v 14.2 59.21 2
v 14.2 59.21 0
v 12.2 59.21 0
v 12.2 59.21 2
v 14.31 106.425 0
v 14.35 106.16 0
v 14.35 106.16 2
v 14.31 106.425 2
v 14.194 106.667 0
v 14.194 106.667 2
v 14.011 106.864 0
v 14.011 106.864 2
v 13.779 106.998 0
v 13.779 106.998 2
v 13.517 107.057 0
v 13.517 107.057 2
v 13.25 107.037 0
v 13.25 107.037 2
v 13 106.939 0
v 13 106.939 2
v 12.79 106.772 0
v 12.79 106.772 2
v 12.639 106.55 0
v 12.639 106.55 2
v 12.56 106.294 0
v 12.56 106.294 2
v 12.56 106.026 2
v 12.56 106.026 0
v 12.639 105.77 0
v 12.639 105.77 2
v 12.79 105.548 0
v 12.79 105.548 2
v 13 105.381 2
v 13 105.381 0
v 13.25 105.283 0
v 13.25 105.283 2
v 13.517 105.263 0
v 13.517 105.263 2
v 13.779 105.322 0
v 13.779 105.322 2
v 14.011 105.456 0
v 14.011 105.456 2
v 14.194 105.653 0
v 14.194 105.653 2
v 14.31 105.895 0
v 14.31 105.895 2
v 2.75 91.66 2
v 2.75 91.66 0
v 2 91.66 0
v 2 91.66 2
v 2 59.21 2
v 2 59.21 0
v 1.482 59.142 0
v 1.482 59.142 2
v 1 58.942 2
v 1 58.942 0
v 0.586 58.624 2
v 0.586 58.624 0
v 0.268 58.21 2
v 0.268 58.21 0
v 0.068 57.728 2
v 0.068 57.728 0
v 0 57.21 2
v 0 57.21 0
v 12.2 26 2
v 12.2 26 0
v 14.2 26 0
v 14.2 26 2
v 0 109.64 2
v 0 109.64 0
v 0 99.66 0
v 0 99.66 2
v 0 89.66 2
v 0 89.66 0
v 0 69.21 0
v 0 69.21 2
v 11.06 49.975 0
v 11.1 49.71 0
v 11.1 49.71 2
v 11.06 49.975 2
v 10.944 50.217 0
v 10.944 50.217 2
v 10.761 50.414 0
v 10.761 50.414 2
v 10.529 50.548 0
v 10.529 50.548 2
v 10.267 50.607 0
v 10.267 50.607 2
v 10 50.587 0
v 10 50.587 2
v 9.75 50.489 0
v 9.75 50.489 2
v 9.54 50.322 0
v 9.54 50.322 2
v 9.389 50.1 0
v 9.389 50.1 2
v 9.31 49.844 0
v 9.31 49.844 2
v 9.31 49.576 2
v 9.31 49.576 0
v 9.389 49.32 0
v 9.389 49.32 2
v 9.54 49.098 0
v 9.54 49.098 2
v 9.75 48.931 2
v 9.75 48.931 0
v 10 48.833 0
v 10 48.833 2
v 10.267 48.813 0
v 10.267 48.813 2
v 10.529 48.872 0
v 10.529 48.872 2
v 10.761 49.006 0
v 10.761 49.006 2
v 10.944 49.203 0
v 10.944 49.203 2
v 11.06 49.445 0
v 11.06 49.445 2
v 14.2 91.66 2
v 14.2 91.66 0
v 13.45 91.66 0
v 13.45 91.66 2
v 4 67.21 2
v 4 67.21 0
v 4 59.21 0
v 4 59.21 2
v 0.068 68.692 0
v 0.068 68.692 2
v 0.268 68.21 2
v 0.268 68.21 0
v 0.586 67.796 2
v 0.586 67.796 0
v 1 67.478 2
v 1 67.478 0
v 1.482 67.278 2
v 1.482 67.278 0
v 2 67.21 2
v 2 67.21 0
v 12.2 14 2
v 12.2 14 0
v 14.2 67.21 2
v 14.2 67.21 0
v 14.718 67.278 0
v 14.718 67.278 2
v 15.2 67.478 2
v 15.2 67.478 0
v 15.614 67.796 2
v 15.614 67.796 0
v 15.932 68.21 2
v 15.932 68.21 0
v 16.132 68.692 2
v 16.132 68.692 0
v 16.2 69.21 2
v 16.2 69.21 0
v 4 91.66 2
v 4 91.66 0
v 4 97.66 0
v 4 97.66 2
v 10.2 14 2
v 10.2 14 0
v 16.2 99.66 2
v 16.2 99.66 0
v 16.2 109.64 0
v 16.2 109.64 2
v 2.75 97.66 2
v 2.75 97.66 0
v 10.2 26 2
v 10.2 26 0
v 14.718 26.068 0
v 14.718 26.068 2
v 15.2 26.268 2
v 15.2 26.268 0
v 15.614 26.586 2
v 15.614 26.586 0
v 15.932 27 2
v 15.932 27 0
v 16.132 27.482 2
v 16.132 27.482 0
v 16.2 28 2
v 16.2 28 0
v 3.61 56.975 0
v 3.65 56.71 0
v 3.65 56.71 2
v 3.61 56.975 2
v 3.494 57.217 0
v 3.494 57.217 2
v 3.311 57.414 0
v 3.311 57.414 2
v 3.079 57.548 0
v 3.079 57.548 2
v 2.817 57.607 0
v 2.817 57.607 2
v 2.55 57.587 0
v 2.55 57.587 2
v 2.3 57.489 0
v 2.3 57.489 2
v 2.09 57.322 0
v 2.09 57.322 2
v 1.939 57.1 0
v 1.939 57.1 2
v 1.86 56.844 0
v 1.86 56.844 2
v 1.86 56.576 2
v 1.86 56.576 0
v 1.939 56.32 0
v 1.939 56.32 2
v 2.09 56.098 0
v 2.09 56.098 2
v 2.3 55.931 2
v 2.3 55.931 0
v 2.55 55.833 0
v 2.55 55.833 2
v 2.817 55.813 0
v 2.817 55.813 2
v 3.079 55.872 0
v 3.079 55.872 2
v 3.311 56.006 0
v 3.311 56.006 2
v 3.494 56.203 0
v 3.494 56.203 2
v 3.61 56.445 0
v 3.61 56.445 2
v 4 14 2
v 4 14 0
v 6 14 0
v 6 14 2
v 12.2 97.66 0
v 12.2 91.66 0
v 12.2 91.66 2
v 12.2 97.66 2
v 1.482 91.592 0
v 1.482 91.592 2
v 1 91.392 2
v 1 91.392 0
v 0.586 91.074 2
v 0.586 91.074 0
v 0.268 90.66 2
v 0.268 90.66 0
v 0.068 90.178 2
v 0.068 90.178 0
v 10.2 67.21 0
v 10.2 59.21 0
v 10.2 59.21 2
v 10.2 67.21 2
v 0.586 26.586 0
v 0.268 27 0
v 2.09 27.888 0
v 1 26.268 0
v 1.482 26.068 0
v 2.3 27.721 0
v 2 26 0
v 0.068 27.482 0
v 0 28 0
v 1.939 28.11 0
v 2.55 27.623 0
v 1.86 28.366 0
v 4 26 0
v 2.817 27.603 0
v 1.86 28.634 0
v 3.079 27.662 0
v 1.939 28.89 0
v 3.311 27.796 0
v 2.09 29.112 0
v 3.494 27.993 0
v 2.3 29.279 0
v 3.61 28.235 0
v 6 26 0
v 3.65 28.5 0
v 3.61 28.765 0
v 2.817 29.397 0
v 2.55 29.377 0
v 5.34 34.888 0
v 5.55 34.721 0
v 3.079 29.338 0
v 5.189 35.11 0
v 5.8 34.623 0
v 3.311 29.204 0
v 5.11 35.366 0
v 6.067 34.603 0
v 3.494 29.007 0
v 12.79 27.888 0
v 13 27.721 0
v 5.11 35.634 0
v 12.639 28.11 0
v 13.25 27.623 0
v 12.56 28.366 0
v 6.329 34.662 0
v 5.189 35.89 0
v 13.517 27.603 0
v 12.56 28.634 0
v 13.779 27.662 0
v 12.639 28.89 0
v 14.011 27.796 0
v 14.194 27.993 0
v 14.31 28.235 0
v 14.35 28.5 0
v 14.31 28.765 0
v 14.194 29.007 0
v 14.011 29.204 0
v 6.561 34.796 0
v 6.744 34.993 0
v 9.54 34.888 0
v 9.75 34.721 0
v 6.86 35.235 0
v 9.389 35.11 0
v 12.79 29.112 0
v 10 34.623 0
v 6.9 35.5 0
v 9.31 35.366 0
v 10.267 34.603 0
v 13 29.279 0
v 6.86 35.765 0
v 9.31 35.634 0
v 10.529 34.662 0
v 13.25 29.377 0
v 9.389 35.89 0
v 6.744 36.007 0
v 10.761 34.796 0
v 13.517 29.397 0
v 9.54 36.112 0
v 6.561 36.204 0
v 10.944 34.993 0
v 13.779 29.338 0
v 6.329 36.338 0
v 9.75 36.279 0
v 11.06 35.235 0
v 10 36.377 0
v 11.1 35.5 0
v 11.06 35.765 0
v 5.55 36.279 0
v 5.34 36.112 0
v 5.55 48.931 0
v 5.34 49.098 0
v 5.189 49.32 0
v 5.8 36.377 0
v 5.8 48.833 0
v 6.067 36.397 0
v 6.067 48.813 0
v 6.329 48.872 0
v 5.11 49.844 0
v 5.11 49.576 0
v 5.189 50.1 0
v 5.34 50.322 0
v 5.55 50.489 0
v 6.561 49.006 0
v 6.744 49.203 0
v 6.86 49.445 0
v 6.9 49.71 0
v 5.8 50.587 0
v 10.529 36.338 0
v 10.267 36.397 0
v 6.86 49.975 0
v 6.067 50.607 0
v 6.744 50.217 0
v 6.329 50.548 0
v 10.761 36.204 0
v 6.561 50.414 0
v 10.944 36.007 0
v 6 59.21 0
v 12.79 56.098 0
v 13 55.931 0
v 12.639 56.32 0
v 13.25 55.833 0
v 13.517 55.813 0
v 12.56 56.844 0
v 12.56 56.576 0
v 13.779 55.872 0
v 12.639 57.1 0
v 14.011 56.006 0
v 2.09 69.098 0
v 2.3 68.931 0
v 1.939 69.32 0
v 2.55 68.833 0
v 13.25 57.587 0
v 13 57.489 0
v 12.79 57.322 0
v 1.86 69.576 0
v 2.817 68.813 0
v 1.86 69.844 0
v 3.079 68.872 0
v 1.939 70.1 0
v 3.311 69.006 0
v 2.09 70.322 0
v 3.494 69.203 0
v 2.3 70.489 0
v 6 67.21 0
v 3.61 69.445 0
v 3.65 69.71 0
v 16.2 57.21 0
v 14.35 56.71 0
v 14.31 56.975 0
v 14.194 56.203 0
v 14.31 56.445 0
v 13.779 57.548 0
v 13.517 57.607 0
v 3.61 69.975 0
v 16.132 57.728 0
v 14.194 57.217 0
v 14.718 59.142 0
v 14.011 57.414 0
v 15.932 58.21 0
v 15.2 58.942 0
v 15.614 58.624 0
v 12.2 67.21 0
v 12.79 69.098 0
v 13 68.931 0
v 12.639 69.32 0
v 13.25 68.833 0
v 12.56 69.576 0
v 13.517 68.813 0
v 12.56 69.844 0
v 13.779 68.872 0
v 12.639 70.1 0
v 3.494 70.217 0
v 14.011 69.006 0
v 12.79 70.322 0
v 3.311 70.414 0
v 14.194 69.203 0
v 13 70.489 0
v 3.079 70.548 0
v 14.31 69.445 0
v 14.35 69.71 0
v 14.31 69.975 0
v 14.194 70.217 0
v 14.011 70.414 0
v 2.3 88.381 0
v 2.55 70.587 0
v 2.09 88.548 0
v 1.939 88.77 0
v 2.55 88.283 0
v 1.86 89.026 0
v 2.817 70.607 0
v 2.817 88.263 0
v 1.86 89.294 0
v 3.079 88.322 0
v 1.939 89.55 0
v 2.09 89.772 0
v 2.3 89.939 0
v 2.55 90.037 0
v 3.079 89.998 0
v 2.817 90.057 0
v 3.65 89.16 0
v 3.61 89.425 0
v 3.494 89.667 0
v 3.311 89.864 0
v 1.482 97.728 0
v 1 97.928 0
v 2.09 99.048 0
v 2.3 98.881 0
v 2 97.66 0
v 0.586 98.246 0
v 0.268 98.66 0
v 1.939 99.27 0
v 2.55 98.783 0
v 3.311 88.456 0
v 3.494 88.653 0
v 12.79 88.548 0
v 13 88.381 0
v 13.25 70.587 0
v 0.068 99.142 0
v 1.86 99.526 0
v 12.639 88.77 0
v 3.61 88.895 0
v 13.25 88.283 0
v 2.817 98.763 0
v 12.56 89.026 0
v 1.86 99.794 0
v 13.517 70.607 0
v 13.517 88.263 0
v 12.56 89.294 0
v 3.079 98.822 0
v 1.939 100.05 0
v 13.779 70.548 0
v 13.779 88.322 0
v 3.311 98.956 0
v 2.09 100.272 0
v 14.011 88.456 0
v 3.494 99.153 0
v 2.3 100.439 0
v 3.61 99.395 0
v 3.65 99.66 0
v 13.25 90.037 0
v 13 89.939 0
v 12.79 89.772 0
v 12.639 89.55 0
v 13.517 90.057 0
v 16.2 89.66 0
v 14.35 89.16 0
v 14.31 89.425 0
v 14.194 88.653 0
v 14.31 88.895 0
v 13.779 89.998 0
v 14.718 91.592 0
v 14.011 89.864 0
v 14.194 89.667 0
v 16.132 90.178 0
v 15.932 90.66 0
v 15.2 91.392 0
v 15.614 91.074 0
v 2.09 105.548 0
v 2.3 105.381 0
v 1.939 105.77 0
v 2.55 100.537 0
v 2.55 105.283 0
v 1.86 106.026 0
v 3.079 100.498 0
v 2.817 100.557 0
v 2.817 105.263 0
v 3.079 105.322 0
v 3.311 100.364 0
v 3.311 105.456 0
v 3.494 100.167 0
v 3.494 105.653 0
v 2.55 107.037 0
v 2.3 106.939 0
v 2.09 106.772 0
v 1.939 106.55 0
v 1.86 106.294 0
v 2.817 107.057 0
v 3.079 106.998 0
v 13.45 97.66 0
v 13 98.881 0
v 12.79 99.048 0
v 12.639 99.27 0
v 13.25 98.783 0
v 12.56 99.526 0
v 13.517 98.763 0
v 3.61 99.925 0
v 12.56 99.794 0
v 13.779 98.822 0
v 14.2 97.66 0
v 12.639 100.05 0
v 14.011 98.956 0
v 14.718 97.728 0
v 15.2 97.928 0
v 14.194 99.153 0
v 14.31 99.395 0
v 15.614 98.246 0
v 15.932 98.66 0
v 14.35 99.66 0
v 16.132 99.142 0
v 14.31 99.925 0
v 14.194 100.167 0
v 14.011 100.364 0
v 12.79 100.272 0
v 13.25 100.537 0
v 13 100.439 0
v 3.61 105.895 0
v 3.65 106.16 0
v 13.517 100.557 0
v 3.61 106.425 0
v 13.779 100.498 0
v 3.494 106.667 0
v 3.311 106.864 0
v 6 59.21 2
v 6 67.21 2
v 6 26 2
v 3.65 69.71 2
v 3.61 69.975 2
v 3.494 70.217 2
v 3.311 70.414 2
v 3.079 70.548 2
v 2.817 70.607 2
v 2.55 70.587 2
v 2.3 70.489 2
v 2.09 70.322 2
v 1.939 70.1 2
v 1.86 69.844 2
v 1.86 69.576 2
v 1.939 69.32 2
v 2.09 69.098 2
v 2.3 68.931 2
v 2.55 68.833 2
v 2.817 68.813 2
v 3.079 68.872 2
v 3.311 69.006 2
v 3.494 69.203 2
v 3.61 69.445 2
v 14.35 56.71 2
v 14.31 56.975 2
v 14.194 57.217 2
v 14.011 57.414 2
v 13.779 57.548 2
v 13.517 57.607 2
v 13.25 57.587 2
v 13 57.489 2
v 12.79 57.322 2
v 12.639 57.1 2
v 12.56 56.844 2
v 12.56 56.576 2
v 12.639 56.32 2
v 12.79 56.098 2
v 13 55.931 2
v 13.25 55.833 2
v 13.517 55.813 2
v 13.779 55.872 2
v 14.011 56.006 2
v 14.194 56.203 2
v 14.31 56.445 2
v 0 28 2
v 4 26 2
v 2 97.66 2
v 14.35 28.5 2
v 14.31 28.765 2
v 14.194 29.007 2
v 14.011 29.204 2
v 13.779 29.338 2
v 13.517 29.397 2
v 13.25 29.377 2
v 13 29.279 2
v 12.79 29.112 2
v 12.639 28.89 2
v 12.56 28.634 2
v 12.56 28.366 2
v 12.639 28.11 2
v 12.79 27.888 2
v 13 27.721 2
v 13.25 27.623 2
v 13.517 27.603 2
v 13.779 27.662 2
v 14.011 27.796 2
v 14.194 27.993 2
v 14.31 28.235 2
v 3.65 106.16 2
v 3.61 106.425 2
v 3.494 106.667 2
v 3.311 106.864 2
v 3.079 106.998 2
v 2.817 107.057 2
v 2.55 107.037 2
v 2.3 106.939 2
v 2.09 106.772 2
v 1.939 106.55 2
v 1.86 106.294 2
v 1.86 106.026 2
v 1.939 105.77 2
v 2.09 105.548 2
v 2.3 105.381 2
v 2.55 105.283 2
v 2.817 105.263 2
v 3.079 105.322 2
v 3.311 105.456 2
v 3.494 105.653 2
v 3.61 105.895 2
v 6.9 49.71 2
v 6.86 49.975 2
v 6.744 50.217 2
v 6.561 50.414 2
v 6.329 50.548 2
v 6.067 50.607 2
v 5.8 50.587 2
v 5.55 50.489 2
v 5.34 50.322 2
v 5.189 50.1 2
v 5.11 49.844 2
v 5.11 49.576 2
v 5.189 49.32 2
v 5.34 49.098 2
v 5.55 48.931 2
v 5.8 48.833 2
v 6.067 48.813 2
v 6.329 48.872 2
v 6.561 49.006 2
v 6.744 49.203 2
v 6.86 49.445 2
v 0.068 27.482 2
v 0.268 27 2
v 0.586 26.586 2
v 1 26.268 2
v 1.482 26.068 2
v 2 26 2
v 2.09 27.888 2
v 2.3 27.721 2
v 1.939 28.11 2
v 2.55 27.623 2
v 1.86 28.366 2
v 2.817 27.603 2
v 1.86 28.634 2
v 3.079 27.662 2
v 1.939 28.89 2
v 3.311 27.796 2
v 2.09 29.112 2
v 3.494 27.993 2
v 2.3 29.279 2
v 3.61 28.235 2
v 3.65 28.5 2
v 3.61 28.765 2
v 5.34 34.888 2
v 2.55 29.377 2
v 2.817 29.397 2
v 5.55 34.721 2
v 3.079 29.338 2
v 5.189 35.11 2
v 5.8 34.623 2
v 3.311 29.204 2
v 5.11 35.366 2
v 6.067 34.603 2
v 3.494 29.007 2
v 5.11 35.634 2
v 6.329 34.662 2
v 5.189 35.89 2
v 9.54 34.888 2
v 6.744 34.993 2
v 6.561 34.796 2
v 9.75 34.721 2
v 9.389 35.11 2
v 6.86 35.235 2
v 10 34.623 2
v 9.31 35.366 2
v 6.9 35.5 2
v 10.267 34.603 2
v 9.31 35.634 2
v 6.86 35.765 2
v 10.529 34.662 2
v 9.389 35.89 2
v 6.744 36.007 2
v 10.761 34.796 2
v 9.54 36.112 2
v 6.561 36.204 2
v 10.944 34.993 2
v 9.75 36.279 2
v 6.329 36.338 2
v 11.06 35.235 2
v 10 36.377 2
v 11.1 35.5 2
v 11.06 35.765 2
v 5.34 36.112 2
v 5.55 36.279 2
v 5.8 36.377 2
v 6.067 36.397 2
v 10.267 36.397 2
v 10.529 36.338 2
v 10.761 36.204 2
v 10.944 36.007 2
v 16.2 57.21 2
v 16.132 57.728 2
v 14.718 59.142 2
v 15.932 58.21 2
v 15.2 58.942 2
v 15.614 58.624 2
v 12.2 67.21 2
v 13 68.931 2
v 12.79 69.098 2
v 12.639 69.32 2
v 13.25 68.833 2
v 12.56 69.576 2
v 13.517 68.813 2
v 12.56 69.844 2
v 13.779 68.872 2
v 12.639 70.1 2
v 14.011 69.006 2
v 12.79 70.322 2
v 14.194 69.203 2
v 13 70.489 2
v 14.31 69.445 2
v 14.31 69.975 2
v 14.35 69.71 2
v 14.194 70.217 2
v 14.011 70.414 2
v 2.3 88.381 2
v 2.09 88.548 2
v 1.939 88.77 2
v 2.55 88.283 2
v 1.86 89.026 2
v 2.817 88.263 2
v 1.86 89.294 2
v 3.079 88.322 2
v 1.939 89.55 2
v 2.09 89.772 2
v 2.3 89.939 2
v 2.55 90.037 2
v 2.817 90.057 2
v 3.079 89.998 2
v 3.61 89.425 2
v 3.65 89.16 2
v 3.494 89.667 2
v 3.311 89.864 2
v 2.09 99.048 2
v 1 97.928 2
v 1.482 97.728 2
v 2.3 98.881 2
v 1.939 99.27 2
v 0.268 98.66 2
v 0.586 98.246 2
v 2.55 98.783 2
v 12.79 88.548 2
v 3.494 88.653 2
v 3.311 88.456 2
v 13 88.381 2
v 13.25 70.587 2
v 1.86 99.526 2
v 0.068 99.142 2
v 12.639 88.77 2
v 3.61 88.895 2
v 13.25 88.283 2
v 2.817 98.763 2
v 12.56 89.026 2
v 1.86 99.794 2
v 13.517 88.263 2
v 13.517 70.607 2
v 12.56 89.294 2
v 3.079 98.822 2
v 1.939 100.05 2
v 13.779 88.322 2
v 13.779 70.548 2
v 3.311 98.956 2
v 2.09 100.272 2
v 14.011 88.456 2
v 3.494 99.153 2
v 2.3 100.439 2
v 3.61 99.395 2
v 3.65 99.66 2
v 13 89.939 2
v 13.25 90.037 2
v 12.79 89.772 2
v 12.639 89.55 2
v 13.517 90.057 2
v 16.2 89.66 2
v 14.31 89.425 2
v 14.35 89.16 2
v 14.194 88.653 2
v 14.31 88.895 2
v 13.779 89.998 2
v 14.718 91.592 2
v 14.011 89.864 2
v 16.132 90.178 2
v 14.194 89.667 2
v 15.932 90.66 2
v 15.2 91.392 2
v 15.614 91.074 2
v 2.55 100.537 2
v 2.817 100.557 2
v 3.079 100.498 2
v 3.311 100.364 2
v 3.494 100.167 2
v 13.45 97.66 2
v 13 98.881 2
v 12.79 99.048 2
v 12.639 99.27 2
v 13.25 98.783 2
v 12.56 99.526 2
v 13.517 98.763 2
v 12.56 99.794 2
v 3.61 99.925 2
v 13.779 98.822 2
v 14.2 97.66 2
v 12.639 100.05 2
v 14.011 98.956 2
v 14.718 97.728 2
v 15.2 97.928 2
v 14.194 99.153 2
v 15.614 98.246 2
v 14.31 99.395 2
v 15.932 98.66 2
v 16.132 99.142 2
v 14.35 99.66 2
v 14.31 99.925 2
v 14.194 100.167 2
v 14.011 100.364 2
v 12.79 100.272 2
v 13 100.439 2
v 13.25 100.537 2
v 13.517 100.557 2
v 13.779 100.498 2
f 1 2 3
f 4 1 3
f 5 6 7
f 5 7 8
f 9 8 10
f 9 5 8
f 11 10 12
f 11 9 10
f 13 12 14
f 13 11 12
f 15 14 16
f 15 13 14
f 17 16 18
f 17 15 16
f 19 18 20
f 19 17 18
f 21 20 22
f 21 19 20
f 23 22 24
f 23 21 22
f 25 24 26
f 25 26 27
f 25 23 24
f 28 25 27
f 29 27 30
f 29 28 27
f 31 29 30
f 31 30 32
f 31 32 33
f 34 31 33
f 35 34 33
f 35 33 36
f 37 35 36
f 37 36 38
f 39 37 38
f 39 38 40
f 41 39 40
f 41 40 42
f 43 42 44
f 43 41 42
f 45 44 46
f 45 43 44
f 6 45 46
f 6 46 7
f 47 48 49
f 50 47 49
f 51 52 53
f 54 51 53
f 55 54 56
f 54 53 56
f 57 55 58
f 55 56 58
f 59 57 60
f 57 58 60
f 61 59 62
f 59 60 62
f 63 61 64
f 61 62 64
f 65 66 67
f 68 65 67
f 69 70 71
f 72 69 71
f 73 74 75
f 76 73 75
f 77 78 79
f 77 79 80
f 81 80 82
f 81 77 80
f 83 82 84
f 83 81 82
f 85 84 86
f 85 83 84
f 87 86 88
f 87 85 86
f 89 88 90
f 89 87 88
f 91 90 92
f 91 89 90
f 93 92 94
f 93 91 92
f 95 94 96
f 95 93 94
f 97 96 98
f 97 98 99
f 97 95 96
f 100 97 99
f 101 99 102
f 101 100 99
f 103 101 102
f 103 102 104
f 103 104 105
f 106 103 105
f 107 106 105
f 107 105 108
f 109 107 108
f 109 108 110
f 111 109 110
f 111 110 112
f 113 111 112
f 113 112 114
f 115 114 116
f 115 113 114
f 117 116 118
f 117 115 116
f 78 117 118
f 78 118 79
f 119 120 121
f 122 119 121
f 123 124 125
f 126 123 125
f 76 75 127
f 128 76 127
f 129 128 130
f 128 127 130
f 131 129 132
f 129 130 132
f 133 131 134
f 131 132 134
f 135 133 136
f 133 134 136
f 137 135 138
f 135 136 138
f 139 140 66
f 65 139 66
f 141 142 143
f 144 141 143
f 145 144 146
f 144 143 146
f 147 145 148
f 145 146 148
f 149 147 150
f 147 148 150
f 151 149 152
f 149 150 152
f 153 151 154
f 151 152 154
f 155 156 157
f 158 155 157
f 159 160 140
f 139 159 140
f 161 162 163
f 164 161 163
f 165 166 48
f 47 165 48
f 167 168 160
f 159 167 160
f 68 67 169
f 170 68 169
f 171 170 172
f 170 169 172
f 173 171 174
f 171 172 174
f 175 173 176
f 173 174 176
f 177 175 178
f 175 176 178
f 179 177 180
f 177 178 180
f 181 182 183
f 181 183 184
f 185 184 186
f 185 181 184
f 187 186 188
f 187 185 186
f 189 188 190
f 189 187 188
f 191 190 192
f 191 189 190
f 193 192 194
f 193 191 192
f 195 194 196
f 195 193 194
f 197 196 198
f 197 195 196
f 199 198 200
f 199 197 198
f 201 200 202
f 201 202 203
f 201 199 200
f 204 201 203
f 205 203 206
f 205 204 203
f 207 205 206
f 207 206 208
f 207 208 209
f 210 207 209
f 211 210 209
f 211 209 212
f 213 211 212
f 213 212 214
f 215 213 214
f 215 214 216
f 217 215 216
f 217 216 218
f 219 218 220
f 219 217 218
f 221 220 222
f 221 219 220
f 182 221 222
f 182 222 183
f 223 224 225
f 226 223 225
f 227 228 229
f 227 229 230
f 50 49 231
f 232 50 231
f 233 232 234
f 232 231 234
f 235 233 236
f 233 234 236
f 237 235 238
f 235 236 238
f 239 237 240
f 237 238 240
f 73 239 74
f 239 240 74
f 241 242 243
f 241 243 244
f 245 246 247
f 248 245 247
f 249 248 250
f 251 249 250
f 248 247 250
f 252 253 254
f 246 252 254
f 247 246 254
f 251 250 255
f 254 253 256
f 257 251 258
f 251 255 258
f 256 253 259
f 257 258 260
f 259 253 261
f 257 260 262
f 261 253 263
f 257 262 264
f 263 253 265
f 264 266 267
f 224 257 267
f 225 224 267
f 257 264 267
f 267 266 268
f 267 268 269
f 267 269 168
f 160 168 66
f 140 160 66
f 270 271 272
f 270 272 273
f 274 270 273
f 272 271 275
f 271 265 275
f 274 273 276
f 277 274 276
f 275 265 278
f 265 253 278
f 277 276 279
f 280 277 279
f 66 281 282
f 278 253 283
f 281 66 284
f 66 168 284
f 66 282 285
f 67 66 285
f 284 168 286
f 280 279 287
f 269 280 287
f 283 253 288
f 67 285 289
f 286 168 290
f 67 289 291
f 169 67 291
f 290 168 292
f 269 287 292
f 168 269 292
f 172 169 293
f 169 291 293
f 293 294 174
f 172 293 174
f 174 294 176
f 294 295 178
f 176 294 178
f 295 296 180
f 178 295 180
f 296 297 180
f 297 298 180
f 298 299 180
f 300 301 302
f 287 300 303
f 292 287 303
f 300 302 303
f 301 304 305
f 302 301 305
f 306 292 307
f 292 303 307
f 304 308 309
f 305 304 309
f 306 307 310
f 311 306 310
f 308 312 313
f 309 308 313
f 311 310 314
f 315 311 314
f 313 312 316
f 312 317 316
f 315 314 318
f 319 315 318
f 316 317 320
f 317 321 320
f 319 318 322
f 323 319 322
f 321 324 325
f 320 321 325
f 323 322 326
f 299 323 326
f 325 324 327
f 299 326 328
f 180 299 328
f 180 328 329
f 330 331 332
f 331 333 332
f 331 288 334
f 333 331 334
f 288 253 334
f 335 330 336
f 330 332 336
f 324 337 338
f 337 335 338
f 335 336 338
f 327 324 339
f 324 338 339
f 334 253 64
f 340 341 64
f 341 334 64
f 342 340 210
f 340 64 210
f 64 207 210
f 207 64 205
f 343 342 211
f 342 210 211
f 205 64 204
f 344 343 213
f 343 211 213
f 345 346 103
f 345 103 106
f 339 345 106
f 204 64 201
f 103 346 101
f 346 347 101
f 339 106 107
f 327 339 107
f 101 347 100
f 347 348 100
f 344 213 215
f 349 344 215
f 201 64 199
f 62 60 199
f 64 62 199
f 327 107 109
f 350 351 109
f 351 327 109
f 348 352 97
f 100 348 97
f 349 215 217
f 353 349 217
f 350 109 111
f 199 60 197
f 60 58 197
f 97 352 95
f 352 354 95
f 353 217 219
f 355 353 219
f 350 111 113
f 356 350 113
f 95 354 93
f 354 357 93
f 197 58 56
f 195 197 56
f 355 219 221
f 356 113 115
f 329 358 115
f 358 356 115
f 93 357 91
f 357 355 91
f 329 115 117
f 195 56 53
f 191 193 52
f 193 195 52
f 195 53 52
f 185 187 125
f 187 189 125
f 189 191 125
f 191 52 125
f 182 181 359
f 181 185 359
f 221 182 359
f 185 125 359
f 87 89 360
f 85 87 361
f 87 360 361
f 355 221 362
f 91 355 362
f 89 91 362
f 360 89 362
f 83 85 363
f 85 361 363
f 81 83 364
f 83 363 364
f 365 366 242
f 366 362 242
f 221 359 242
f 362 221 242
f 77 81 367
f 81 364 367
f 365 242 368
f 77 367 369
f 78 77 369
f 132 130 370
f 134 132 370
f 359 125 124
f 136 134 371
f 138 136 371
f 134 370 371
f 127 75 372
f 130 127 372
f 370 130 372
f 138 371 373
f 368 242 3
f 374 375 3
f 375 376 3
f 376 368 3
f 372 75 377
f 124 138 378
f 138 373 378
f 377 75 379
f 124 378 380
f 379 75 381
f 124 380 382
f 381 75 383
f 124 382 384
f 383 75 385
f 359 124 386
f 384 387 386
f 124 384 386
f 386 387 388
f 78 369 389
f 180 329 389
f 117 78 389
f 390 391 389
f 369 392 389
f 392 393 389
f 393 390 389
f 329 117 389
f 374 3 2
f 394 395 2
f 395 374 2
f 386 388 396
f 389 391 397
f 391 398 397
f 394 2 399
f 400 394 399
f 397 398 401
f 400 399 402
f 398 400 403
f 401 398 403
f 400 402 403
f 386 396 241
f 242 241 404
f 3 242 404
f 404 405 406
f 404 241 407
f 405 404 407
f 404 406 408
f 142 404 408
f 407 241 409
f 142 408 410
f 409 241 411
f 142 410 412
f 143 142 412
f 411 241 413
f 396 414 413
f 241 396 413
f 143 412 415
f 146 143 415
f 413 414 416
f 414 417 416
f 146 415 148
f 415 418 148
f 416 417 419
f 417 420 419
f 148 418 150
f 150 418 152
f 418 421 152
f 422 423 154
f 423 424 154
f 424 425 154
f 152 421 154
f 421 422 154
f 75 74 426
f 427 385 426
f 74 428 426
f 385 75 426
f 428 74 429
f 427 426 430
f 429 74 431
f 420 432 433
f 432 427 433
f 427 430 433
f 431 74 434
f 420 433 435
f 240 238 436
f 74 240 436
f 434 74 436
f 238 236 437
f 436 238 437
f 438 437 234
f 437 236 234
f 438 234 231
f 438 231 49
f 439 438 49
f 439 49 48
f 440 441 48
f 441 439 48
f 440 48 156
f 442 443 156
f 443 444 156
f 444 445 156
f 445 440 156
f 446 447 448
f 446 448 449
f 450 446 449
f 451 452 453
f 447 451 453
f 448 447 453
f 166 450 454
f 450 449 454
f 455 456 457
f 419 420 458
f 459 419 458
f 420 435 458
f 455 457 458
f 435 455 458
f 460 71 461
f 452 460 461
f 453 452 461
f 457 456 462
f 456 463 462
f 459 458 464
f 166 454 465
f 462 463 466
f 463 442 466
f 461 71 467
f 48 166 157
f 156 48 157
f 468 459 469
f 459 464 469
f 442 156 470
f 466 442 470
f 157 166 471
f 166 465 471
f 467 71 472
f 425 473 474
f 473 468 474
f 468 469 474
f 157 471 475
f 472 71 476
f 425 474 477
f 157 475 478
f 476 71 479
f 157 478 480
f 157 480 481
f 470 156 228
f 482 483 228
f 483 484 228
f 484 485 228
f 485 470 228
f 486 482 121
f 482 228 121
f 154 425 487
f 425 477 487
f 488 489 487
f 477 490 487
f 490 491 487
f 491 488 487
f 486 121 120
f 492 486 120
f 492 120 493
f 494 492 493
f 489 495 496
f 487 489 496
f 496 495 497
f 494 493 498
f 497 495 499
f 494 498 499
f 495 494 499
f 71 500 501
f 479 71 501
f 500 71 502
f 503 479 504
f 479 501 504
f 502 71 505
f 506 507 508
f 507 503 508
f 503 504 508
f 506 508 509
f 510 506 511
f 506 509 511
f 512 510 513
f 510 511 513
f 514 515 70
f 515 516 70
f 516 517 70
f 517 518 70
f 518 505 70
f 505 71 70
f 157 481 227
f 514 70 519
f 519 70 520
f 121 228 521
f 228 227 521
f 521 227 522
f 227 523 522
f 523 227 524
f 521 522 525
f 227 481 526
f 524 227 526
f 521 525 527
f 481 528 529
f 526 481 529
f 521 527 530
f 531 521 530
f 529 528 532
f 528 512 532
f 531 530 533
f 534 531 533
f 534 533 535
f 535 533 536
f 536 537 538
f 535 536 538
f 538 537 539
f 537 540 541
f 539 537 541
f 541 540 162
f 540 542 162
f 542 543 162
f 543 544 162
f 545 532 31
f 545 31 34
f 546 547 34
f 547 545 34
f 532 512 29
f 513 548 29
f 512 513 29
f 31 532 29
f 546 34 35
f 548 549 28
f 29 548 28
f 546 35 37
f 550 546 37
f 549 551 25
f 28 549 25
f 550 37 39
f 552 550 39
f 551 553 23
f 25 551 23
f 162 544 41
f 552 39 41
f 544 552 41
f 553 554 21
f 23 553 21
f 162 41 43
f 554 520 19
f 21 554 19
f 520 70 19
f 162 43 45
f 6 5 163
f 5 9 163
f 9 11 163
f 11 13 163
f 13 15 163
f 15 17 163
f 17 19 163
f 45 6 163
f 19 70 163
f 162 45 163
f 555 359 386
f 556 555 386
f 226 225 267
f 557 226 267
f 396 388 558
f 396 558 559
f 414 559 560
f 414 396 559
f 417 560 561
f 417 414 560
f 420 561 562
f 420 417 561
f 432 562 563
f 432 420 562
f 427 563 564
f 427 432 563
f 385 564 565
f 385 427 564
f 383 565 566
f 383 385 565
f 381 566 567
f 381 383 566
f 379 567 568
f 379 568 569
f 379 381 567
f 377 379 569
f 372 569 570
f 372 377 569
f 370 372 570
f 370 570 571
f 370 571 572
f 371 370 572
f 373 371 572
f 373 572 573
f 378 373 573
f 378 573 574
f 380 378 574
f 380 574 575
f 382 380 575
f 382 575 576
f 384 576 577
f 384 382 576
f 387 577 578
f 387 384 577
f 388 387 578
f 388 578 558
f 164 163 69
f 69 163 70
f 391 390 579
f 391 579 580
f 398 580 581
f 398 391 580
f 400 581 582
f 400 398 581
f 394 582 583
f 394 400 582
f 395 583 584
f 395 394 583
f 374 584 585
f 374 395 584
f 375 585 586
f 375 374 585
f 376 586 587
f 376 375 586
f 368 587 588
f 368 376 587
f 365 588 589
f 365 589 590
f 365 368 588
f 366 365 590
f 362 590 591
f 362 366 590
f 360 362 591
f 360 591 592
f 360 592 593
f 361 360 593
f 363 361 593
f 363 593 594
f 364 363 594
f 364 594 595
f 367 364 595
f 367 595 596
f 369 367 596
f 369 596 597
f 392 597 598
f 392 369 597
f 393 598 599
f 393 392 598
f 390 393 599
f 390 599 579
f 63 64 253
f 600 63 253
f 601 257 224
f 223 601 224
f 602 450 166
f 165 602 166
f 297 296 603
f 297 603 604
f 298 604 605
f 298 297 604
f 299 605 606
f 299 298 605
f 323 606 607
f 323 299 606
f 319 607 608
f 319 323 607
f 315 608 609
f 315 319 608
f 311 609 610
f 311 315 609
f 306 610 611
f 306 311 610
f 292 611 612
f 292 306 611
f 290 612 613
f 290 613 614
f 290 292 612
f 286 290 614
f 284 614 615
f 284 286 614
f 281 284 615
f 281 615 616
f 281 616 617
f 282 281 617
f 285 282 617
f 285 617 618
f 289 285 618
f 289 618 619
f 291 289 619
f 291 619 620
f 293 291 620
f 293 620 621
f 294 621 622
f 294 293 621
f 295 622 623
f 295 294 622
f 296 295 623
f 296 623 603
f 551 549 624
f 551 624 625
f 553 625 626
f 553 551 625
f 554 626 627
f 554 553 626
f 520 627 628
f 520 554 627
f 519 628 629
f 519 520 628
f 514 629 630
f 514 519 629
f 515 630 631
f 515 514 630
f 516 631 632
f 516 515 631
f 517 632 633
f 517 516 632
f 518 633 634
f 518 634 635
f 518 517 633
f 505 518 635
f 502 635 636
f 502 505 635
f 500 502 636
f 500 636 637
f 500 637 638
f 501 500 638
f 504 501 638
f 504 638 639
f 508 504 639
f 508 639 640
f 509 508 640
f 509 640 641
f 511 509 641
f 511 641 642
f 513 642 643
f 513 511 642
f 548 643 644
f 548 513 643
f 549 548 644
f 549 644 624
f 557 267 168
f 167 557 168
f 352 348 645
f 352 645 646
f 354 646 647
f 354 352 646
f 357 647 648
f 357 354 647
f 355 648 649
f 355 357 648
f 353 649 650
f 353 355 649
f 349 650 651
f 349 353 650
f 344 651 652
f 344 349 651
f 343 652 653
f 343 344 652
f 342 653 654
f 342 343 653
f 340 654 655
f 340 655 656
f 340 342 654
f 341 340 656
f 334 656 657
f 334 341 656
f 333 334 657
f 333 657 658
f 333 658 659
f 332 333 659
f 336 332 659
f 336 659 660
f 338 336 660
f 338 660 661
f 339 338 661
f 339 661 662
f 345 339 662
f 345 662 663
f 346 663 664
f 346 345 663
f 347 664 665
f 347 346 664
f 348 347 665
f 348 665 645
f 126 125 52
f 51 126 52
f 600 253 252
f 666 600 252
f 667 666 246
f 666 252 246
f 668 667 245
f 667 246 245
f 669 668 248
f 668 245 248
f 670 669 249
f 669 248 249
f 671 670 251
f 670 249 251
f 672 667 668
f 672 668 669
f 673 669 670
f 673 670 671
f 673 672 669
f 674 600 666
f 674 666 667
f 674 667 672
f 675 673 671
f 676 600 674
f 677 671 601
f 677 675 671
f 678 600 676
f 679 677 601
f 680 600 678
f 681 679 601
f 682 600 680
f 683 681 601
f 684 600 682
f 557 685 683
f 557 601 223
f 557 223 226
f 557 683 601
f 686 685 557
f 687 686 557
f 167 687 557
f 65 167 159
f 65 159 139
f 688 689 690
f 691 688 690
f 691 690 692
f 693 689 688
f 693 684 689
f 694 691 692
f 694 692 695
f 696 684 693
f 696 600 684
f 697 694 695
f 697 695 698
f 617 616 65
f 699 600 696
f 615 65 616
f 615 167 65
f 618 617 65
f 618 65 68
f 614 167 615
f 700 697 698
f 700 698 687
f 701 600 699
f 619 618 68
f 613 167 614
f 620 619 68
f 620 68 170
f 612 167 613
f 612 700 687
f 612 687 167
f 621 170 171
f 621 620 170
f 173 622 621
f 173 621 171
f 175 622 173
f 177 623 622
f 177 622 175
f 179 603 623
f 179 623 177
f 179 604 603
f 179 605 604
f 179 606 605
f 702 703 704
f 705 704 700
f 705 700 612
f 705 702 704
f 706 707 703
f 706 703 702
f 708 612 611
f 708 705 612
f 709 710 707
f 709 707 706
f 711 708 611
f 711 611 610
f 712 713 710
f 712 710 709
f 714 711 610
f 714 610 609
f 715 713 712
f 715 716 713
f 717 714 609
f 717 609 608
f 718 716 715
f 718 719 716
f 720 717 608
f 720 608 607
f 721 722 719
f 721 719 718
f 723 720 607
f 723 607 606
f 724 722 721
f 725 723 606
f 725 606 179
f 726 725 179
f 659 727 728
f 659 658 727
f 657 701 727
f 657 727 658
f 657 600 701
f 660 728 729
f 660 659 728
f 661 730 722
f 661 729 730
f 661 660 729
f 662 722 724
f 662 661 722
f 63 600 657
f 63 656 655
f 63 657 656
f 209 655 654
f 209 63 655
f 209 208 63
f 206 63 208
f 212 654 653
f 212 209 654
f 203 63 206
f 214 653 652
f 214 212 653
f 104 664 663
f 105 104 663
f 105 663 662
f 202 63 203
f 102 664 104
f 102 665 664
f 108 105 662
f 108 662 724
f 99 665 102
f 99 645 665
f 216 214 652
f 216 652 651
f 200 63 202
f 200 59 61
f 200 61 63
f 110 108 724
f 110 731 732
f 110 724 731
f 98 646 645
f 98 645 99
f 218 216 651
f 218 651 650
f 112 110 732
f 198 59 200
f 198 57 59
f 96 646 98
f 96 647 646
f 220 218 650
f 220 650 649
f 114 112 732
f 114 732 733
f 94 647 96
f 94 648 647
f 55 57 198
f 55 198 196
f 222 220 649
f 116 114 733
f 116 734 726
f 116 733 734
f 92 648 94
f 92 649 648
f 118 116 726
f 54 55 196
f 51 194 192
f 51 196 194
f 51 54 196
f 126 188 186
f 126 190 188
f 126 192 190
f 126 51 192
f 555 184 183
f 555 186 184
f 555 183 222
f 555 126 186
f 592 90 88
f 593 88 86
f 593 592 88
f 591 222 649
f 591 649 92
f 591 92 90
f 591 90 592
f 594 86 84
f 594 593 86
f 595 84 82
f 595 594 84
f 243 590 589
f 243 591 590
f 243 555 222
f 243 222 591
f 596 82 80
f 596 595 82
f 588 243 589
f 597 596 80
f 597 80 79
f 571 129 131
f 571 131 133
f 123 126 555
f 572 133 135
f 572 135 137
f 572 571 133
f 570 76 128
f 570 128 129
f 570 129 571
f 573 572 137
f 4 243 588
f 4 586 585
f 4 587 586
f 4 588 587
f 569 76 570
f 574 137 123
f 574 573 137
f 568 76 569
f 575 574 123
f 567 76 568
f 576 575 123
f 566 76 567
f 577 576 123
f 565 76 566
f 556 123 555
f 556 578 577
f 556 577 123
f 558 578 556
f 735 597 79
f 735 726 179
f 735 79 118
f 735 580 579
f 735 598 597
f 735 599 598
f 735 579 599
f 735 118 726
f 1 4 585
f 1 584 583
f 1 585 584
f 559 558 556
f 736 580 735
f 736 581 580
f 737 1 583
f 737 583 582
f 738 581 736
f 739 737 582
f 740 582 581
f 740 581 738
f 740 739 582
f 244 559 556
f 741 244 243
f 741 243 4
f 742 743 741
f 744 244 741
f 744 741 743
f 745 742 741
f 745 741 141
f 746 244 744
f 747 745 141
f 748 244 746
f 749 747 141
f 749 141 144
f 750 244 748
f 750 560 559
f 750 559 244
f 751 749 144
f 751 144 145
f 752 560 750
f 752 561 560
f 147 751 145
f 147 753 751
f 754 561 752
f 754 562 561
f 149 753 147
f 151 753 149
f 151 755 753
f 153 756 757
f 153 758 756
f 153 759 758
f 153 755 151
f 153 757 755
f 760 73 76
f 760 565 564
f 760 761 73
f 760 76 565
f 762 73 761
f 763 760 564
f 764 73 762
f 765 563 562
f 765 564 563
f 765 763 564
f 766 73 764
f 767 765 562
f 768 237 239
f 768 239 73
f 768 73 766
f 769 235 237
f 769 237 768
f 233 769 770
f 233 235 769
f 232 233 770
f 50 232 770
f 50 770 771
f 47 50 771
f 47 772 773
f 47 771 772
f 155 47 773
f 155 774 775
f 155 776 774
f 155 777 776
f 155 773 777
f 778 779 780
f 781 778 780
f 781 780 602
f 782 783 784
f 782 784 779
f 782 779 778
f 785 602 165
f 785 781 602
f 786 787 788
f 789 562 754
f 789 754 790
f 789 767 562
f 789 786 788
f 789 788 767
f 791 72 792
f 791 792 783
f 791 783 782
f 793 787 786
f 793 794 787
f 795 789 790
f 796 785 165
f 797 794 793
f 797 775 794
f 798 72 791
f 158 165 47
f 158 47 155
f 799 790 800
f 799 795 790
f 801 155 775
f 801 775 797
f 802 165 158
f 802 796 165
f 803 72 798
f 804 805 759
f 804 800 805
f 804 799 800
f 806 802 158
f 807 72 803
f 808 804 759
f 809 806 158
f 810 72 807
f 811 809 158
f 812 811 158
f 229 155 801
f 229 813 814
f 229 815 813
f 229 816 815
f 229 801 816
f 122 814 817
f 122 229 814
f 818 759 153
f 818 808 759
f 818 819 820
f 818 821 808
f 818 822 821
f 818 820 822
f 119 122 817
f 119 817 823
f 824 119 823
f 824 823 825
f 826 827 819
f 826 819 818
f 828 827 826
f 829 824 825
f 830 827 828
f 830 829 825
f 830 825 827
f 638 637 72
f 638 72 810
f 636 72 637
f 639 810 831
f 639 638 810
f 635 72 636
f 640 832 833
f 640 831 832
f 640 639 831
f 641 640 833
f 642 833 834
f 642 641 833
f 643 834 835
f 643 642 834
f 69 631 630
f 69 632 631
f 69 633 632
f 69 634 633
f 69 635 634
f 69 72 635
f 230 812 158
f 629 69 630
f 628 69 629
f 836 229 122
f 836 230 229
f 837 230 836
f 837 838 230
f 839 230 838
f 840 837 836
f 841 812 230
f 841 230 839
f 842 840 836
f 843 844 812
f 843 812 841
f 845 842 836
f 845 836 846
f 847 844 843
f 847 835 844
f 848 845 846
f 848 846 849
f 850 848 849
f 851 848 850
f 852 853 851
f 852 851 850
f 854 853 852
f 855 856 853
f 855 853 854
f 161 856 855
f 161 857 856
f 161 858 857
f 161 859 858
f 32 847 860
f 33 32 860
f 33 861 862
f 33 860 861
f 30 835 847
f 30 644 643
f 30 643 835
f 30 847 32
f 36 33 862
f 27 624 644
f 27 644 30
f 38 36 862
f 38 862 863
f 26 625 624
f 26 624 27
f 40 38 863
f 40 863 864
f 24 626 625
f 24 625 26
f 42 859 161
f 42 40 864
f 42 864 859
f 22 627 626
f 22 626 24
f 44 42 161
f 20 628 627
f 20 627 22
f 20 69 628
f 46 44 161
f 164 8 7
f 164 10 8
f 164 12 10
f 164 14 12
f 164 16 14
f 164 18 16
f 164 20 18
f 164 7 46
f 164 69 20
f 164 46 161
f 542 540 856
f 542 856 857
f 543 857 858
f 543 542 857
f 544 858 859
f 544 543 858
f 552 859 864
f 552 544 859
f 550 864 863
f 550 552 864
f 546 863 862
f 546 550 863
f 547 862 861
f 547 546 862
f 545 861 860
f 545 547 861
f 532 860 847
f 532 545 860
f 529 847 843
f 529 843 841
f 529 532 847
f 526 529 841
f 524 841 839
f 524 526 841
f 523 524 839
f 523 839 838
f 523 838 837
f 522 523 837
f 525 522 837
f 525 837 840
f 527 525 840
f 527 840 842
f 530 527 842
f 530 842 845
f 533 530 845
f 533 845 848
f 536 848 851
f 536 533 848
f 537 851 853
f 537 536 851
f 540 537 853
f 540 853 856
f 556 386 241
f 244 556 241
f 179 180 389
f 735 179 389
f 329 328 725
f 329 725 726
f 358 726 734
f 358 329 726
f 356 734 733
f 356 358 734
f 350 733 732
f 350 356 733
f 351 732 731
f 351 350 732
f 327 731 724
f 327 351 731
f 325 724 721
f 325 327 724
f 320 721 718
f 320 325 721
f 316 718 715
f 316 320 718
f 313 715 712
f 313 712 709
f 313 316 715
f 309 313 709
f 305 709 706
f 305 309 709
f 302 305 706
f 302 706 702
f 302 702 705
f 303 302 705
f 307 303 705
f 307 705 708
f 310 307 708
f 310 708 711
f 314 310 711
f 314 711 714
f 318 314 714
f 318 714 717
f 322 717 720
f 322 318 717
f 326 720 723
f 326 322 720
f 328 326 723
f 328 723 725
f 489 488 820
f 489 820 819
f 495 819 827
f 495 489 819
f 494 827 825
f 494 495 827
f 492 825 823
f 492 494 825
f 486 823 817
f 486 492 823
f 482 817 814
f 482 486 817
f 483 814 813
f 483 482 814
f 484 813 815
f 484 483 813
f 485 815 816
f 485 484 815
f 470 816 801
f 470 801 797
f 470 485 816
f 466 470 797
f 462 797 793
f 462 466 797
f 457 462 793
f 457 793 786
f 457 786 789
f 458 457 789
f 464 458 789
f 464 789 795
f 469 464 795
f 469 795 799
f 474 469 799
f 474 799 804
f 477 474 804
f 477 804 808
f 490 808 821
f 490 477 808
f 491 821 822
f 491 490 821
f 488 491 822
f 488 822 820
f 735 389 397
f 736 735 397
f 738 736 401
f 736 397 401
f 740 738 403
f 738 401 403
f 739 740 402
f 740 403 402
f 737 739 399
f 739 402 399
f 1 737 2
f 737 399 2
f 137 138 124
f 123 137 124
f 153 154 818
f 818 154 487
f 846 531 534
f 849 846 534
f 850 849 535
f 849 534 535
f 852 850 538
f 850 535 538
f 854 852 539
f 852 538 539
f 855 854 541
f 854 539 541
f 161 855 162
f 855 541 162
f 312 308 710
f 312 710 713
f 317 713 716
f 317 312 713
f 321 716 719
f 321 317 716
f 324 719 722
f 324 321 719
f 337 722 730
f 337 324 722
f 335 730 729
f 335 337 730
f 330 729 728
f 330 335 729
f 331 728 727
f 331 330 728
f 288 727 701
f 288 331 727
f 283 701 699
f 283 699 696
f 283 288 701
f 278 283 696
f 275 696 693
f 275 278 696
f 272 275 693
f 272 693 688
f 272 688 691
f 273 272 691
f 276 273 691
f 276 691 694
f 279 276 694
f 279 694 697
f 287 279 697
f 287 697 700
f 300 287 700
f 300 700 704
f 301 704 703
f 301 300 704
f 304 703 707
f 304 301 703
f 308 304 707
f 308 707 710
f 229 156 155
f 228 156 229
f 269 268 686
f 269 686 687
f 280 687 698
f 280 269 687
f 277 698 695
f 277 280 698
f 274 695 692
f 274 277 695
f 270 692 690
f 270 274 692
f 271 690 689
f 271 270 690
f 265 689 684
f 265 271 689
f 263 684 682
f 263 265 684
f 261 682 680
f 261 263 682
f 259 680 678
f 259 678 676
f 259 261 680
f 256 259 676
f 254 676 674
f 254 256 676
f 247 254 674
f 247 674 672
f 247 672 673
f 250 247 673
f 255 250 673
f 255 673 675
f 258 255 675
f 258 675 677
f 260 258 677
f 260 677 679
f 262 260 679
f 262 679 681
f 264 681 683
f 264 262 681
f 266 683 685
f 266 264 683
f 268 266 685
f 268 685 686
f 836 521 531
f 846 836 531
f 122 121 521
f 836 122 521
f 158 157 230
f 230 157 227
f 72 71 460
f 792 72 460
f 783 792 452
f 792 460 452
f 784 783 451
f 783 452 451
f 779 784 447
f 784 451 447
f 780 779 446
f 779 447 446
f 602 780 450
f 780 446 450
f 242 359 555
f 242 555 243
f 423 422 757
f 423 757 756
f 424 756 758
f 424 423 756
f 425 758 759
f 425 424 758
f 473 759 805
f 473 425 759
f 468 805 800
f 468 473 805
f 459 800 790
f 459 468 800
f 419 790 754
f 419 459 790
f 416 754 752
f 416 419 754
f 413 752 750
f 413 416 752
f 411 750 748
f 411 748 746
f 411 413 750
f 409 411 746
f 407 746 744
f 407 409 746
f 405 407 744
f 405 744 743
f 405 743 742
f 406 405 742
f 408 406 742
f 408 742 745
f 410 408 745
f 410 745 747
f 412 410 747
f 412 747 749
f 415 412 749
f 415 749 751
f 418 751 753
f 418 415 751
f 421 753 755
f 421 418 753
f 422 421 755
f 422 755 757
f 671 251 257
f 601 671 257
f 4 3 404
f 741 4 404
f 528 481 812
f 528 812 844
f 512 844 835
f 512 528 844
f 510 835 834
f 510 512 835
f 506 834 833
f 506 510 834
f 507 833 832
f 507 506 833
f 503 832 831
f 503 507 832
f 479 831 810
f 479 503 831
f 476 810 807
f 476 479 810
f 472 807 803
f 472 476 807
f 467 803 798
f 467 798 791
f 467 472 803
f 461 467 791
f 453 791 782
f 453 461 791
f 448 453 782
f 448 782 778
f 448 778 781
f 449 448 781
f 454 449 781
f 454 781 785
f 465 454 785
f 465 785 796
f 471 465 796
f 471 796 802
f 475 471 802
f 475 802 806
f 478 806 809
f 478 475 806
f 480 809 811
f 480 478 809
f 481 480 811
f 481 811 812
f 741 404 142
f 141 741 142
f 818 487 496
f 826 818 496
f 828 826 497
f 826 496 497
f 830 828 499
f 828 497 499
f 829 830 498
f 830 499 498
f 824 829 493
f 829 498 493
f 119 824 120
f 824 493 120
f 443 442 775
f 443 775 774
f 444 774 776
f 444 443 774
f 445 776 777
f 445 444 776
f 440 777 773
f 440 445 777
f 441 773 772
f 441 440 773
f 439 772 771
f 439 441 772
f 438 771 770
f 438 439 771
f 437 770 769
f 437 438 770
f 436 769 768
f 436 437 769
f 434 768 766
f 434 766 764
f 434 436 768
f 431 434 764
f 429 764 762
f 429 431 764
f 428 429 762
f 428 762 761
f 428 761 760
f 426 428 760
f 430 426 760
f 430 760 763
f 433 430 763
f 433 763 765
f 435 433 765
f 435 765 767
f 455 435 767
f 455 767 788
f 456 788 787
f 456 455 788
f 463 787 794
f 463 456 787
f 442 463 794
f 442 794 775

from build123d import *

# Parameters (mm, degrees)
SKETCH1_R           = 0.9
SKETCH1_W           = 4.2
SKETCH1_H           = 8
SKETCH1_W_2         = 8.2
SKETCH1_H_2         = 6
BOSS_EXTRUDE1_DEPTH = 2


with BuildPart() as part:
    # Sketch1 → Boss-Extrude1 (new body)
    with BuildSketch(Plane.XY):
        with BuildLine():
            Line((16.2, 109.64), (0, 109.64))
            Line((0, 109.64), (0, 99.66))
            ThreePointArc((0, 99.66), (0.585786438, 98.245786438), (2, 97.66))
            Line((2, 97.66), (2.75, 97.66))
            Line((2.75, 97.66), (2.75, 91.66))
            Line((2.75, 91.66), (2, 91.66))
            ThreePointArc((2, 91.66), (0.585786438, 91.074213562), (0, 89.66))
            Line((0, 89.66), (0, 69.21))
            ThreePointArc((0, 69.21), (0.585786438, 67.795786438), (2, 67.21))
            Line((2, 67.21), (4, 67.21))
            Line((4, 67.21), (4, 59.21))
            Line((4, 59.21), (2, 59.21))
            ThreePointArc((2, 59.21), (0.585786438, 58.624213562), (0, 57.21))
            Line((0, 57.21), (0, 28))
            ThreePointArc((0, 28), (0.585786438, 26.585786438), (2, 26))
            Line((2, 26), (4, 26))
            Line((4, 26), (4, 14))
            Line((4, 14), (6, 14))
            Line((6, 14), (6, 26))
            Line((6, 26), (10.2, 26))
            Line((10.2, 26), (10.2, 14))
            Line((10.2, 14), (12.2, 14))
            Line((12.2, 14), (12.2, 26))
            Line((12.2, 26), (14.2, 26))
            ThreePointArc((14.2, 26), (15.614213562, 26.585786438), (16.2, 28))
            Line((16.2, 28), (16.2, 57.21))
            ThreePointArc((16.2, 57.21), (15.614213562, 58.624213562), (14.2, 59.21))
            Line((14.2, 59.21), (12.2, 59.21))
            Line((12.2, 59.21), (12.2, 67.21))
            Line((12.2, 67.21), (14.2, 67.21))
            ThreePointArc((14.2, 67.21), (15.614213562, 67.795786438), (16.2, 69.21))
            Line((16.2, 69.21), (16.2, 89.66))
            ThreePointArc((16.2, 89.66), (15.614213562, 91.074213562), (14.2, 91.66))
            Line((14.2, 91.66), (13.45, 91.66))
            Line((13.45, 91.66), (13.45, 97.66))
            Line((13.45, 97.66), (14.2, 97.66))
            ThreePointArc((14.2, 97.66), (15.614213562, 98.245786438), (16.2, 99.66))
            Line((16.2, 99.66), (16.2, 109.64))
        make_face()
        with Locations((13.45, 56.71)):
            Circle(SKETCH1_R, mode=Mode.SUBTRACT)
        with Locations((10.2, 49.71)):
            Circle(SKETCH1_R, mode=Mode.SUBTRACT)
        with Locations((13.45, 106.16)):
            Circle(SKETCH1_R, mode=Mode.SUBTRACT)
        with Locations((2.75, 99.66)):
            Circle(SKETCH1_R, mode=Mode.SUBTRACT)
        with Locations((6, 49.71)):
            Circle(SKETCH1_R, mode=Mode.SUBTRACT)
        with Locations((2.75, 28.5)):
            Circle(SKETCH1_R, mode=Mode.SUBTRACT)
        with Locations((2.75, 89.16)):
            Circle(SKETCH1_R, mode=Mode.SUBTRACT)
        with Locations((2.75, 56.71)):
            Circle(SKETCH1_R, mode=Mode.SUBTRACT)
        with Locations((13.45, 89.16)):
            Circle(SKETCH1_R, mode=Mode.SUBTRACT)
        with Locations((13.45, 99.66)):
            Circle(SKETCH1_R, mode=Mode.SUBTRACT)
        with Locations((13.45, 69.71)):
            Circle(SKETCH1_R, mode=Mode.SUBTRACT)
        with Locations((6, 35.5)):
            Circle(SKETCH1_R, mode=Mode.SUBTRACT)
        with Locations((2.75, 106.16)):
            Circle(SKETCH1_R, mode=Mode.SUBTRACT)
        with Locations((10.2, 35.5)):
            Circle(SKETCH1_R, mode=Mode.SUBTRACT)
        with Locations((2.75, 69.71)):
            Circle(SKETCH1_R, mode=Mode.SUBTRACT)
        with Locations((13.45, 28.5)):
            Circle(SKETCH1_R, mode=Mode.SUBTRACT)
        with Locations((8.1, 63.21)):
            Rectangle(SKETCH1_W, SKETCH1_H, mode=Mode.SUBTRACT)
        with Locations((8.1, 94.66)):
            Rectangle(SKETCH1_W_2, SKETCH1_H_2, mode=Mode.SUBTRACT)
    extrude(amount=BOSS_EXTRUDE1_DEPTH)


solid = part.part
